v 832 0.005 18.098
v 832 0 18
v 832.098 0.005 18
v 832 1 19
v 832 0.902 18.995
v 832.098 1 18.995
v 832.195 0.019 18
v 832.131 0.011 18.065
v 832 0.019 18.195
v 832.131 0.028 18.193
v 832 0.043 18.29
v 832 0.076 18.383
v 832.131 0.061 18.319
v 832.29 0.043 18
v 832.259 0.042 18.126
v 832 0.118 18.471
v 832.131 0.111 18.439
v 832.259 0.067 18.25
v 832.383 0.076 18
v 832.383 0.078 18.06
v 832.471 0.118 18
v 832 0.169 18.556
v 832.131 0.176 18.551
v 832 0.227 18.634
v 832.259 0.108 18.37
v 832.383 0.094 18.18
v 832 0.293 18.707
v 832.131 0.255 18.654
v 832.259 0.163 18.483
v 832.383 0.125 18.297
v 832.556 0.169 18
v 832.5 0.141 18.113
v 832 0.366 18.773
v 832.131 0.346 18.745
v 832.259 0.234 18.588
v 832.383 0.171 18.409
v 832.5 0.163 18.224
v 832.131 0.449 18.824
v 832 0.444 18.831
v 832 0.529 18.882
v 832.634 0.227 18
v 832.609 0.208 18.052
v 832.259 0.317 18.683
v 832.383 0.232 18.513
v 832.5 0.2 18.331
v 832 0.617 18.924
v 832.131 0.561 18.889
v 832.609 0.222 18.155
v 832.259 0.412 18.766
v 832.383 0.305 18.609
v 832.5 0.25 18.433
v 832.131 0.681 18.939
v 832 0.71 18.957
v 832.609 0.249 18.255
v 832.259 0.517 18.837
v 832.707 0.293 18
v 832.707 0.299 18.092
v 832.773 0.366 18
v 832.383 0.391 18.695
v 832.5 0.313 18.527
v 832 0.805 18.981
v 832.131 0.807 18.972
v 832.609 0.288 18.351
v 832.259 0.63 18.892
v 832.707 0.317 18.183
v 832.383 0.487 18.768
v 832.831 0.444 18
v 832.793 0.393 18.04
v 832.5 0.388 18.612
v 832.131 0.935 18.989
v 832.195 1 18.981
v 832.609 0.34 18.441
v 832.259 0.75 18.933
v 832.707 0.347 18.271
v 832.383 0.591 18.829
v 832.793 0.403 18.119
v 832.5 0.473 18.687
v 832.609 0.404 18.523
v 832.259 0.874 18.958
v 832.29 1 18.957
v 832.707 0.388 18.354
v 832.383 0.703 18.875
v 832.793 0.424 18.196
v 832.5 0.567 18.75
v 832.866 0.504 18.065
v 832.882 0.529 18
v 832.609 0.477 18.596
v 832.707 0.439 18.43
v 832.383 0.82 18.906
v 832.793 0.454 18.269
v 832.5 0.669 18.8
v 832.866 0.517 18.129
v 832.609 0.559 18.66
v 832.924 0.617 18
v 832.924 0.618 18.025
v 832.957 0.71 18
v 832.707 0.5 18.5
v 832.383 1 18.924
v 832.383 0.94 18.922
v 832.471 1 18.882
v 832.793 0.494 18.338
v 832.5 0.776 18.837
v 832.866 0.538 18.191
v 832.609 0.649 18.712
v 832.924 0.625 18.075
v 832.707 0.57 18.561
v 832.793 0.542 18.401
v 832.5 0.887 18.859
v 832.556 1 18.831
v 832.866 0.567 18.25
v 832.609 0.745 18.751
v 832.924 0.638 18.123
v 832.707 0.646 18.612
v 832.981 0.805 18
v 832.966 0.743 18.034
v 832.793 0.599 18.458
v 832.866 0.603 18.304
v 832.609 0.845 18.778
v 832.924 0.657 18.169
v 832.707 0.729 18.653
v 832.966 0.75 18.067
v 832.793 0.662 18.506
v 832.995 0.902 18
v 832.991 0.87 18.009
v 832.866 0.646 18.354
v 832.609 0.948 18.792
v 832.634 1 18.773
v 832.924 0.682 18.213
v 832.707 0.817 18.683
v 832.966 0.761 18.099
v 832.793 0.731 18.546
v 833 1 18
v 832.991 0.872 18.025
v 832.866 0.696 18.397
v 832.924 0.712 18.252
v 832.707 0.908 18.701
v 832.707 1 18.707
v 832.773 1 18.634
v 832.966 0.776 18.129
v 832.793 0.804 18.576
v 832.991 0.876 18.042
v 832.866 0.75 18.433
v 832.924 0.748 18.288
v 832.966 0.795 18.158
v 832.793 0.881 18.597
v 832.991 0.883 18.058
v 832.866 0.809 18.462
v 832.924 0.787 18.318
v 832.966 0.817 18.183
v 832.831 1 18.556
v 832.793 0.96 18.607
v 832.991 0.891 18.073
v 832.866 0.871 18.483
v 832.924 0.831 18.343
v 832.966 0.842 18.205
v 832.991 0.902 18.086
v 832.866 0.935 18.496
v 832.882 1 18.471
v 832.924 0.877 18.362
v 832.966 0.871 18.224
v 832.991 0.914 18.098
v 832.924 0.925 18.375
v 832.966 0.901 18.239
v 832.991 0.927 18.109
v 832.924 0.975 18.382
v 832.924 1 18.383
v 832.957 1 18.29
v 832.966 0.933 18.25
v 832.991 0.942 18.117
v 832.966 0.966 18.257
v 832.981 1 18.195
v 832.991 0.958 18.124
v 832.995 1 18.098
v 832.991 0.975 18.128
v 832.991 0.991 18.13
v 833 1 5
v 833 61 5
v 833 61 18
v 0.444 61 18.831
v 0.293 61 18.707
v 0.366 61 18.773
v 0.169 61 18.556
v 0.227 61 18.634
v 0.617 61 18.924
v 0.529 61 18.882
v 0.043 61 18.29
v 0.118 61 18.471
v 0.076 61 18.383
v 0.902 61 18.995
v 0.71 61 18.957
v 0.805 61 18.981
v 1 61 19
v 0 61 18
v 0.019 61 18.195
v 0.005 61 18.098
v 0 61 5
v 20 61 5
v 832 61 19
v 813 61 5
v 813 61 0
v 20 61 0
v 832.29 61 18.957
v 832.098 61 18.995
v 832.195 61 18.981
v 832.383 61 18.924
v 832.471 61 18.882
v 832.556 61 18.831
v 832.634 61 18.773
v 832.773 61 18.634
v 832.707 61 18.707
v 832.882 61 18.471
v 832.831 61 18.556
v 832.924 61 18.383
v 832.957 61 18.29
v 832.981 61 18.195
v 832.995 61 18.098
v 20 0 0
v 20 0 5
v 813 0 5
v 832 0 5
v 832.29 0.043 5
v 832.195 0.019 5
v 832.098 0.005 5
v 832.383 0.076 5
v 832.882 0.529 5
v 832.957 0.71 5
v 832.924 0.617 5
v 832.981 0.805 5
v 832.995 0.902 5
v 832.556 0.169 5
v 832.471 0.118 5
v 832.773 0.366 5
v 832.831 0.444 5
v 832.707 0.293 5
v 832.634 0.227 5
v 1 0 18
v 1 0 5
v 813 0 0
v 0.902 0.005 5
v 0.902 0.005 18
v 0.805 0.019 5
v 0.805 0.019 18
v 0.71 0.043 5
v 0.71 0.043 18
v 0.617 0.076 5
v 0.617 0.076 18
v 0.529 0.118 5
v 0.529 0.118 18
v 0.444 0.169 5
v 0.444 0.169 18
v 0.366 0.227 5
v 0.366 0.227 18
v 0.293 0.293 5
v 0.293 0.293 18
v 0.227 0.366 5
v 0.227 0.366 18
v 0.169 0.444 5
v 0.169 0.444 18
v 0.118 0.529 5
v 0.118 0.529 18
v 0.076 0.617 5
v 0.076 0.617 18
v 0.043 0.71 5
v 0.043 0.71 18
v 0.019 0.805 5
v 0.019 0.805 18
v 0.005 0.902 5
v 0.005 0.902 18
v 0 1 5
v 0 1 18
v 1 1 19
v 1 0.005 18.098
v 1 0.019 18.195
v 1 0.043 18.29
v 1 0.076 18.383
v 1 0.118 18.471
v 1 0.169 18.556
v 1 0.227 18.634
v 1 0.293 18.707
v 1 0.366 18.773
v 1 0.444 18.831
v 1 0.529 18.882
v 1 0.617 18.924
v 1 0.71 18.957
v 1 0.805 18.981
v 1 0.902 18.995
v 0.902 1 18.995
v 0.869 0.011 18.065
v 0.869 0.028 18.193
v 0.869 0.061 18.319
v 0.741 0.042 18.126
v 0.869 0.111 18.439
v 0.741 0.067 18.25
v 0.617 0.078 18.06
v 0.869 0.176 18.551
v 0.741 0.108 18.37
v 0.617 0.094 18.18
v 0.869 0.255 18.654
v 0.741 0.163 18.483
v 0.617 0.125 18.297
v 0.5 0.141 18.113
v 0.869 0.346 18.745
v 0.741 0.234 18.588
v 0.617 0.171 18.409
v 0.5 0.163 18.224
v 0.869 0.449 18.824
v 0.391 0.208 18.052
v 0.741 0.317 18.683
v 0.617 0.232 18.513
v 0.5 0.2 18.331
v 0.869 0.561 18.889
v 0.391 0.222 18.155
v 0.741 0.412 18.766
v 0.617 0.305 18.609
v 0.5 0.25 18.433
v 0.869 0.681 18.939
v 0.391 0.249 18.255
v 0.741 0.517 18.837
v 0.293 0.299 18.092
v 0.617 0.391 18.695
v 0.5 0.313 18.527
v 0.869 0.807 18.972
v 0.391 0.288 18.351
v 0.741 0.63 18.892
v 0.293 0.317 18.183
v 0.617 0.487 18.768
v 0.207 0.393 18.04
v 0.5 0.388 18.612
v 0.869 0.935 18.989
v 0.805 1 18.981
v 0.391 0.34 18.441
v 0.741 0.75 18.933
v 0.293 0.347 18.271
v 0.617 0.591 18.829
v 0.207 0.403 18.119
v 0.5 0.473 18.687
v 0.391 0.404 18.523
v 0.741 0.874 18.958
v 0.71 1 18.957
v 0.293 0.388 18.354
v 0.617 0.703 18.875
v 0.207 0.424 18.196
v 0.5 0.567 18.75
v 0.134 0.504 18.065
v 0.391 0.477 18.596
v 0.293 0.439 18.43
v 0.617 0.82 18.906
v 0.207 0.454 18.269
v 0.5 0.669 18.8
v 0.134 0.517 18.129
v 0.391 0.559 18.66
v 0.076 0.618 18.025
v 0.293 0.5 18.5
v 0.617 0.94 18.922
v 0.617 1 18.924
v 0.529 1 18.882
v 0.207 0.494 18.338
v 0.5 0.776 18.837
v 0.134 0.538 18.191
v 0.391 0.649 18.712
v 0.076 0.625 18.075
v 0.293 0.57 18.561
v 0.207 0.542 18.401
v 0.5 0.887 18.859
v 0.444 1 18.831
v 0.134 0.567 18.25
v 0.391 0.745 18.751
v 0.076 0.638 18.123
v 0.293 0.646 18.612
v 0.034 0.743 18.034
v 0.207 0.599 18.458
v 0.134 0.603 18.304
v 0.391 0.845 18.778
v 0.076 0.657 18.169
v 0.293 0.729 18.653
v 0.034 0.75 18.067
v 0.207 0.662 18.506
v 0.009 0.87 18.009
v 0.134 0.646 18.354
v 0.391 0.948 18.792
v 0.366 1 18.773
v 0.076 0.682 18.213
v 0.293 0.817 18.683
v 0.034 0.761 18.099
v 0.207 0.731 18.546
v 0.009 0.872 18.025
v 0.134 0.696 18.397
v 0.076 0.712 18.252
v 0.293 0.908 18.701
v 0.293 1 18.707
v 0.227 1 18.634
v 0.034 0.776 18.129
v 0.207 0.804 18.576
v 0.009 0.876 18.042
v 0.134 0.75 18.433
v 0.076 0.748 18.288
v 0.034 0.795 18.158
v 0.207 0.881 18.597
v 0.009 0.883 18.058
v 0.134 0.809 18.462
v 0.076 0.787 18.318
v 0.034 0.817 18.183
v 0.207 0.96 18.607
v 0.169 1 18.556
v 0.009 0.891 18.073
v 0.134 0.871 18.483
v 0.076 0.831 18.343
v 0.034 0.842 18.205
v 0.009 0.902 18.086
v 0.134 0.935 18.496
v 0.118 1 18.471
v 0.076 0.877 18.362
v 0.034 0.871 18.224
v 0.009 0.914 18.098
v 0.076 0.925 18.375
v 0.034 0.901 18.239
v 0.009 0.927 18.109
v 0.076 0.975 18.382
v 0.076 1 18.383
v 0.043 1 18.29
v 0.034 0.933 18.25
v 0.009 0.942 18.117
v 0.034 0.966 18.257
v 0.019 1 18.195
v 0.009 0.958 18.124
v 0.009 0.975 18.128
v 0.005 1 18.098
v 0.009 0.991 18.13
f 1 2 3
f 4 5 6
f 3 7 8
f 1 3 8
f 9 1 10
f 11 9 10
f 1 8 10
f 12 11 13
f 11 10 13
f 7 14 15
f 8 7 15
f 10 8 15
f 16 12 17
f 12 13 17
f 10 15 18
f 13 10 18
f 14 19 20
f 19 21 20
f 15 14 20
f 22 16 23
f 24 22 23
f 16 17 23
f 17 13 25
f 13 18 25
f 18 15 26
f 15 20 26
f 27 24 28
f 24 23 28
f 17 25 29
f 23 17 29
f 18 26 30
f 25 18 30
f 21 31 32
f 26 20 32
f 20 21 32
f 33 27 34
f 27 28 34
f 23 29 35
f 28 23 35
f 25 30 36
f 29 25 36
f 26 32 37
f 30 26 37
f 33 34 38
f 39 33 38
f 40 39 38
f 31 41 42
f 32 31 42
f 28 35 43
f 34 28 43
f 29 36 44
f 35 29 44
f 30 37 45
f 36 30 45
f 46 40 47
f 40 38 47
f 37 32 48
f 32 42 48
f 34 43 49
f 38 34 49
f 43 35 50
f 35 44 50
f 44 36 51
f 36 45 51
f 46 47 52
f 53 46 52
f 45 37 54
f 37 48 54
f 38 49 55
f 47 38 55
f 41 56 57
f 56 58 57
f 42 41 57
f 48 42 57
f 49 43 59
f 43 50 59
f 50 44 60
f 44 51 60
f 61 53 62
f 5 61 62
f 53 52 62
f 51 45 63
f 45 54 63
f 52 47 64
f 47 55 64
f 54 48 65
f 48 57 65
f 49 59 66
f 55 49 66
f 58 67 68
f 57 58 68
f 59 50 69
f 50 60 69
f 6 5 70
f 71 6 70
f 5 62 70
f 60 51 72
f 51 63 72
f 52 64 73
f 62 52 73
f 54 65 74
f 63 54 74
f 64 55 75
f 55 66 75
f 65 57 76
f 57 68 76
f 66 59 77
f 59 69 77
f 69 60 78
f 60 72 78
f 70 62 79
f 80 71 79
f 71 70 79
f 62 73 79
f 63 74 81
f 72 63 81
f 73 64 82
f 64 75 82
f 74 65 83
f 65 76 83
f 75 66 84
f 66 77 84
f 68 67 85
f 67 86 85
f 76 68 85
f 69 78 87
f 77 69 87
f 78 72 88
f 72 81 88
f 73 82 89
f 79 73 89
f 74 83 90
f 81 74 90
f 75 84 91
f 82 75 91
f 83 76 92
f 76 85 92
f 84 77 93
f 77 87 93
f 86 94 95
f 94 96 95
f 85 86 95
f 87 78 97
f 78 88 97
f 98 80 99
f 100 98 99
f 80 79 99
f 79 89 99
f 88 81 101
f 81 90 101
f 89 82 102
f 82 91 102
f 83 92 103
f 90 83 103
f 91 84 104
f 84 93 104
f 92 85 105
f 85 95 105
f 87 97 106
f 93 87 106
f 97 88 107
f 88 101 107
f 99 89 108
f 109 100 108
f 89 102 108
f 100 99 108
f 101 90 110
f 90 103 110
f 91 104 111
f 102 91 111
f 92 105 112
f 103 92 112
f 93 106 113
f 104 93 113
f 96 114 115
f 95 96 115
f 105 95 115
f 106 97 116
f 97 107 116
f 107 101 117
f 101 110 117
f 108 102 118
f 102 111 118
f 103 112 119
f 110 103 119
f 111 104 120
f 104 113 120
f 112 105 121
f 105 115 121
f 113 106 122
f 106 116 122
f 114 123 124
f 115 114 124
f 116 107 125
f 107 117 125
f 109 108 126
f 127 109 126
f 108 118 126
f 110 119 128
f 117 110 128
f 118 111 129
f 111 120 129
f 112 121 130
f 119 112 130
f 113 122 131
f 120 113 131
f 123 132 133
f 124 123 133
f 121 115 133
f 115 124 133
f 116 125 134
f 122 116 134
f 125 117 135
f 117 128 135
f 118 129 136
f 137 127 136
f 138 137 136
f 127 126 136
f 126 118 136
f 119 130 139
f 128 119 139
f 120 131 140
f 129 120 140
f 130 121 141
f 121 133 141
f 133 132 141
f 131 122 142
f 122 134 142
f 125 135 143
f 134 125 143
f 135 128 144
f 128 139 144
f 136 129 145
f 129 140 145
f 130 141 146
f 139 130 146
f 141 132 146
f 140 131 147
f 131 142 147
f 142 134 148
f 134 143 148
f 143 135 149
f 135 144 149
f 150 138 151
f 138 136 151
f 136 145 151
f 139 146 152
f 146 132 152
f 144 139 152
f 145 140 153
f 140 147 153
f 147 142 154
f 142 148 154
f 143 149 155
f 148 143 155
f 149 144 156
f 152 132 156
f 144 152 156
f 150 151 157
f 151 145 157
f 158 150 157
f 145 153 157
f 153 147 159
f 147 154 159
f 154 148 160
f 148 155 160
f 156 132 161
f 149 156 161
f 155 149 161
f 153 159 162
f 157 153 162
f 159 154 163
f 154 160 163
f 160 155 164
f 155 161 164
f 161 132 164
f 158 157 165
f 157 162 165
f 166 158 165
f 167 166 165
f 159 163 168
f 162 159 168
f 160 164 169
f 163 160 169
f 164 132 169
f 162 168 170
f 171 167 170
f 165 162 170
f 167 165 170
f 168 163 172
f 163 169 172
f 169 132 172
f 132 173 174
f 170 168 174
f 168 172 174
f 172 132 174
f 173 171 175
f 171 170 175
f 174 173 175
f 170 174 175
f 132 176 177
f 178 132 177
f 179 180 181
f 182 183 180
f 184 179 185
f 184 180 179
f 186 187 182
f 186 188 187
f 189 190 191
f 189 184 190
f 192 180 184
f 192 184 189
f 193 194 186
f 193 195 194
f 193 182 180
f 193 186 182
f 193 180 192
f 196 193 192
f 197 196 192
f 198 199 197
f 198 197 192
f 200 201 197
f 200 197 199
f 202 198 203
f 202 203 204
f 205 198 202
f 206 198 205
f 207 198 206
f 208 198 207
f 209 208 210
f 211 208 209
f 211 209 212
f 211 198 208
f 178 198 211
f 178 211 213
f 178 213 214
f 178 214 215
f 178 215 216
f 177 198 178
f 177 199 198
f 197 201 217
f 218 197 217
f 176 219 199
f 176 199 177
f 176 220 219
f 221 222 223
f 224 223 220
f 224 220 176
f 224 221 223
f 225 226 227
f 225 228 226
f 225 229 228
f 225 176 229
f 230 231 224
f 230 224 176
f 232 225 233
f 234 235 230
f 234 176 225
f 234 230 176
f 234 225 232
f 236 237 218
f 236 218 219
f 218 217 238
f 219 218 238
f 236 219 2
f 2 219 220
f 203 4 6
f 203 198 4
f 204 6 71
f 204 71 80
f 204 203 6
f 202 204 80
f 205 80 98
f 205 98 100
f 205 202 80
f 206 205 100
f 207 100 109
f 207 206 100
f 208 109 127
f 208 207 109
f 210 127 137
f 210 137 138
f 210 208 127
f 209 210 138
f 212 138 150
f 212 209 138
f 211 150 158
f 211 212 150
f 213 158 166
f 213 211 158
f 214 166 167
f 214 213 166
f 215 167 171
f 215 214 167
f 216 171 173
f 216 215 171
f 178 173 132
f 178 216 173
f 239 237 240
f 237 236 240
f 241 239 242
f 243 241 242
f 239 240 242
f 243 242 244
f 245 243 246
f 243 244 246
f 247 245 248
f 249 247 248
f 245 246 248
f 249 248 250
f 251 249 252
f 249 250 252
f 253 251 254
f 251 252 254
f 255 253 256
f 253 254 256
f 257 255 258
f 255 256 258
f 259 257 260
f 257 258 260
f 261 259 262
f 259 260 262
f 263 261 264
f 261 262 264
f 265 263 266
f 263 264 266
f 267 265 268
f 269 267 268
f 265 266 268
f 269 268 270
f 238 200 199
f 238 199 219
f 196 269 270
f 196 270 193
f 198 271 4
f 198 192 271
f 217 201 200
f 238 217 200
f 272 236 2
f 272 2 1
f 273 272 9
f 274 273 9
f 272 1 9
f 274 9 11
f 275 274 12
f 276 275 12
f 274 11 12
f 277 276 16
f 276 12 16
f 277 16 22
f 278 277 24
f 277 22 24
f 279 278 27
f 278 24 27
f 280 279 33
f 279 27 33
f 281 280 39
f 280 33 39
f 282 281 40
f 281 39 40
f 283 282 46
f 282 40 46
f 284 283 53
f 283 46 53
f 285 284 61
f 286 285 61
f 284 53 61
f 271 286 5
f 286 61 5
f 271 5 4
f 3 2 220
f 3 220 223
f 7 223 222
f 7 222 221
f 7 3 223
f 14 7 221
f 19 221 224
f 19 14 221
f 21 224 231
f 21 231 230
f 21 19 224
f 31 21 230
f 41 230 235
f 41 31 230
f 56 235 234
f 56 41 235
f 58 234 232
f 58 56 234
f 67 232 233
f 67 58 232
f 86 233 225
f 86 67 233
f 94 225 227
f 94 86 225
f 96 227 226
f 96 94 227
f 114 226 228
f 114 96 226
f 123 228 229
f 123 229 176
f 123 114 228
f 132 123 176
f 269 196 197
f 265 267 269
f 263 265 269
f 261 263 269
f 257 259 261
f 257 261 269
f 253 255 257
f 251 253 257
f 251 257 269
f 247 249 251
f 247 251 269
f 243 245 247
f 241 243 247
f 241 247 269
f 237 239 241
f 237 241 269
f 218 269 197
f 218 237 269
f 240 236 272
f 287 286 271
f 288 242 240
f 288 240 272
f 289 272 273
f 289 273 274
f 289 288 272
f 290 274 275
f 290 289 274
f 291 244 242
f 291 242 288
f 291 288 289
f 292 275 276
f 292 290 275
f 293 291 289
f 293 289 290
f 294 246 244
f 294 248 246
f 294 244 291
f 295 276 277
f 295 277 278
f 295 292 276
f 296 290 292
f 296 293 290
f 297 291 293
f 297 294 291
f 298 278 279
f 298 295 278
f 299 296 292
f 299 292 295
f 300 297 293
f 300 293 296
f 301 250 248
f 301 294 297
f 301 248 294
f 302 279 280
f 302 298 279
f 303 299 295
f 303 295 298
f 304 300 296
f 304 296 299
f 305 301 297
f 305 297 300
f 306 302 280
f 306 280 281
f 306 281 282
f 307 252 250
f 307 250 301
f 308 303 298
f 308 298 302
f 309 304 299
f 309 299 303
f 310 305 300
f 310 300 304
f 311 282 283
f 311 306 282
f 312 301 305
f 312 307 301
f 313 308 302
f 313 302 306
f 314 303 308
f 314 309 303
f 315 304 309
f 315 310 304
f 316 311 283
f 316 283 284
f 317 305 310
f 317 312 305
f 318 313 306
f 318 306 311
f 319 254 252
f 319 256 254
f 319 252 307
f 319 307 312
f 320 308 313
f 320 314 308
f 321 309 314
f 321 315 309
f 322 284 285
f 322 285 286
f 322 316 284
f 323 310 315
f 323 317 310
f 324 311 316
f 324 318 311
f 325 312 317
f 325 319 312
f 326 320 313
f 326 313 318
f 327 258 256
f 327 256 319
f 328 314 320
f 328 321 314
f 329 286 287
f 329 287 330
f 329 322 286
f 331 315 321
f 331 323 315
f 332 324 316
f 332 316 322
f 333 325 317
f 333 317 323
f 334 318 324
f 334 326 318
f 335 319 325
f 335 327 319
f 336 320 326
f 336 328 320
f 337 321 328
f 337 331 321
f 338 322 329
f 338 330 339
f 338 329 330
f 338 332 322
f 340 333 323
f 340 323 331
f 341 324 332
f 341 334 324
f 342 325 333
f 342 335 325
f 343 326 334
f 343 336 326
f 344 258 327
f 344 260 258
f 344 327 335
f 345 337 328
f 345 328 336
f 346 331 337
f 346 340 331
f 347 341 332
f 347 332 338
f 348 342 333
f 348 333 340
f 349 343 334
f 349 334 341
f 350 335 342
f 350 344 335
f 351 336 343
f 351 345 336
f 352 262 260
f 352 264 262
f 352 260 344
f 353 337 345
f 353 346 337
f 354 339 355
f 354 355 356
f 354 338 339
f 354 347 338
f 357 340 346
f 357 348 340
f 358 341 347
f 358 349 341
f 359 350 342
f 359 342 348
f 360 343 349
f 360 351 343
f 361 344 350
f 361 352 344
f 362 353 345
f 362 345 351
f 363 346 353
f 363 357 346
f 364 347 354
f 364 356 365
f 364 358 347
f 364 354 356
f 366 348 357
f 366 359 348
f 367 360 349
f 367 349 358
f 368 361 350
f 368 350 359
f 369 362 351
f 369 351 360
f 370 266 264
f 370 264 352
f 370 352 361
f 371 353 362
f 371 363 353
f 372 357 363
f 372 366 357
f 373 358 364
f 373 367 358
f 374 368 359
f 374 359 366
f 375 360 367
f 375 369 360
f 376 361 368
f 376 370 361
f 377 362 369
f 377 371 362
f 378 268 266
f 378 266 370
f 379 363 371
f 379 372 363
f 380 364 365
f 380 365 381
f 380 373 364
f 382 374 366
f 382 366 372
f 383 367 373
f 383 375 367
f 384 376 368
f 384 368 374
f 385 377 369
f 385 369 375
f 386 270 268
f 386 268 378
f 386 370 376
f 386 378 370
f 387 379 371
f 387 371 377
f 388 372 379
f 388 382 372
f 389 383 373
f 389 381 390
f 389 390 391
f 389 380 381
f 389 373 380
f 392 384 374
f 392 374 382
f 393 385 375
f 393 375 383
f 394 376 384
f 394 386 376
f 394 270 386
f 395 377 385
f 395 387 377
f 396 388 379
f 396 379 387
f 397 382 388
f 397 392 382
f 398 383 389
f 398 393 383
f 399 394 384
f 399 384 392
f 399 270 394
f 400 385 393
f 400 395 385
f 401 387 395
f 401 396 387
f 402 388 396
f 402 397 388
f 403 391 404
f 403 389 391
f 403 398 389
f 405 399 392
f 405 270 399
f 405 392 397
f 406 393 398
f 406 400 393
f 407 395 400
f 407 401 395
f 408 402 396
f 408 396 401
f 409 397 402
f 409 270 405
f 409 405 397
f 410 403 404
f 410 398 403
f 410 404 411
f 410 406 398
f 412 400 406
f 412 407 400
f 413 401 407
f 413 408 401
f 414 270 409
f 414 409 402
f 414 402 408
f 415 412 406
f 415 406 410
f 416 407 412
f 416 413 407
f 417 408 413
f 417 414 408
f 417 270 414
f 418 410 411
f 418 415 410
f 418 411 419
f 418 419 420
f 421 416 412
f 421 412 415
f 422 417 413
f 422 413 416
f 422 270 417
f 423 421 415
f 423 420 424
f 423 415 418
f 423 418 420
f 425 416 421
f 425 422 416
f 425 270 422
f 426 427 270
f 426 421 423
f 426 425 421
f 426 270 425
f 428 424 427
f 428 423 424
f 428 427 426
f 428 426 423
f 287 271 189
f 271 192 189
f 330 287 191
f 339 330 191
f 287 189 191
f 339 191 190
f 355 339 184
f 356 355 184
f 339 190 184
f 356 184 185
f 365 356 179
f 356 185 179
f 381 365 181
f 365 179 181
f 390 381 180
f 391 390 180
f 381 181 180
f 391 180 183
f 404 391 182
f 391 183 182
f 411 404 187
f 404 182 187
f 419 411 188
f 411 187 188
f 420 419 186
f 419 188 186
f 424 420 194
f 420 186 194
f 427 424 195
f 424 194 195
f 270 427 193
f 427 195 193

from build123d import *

# Parameters (mm, degrees)
BOX_W           = 833
BOX_H           = 61
BOX_DEPTH       = 19
FILLET_R        = 1
FILLET001_R     = 1
SKETCH_W        = 20
SKETCH_H        = 63
POCKET_DEPTH    = 5
SKETCH001_W     = 20
SKETCH001_H     = 63
POCKET001_DEPTH = 5
FILLET002_R     = 1


with BuildPart() as part:
    # Box → Box (new body)
    with BuildSketch(Plane.XY):
        with Locations((416.5, 30.5)):
            Rectangle(BOX_W, BOX_H)
    extrude(amount=BOX_DEPTH)

    # Fillet
    fillet_edges = [part.edges().sort_by_distance(p)[0] for p in [
        (416.5, 0, 19),
    ]]
    fillet(fillet_edges, radius=FILLET_R)

    # Fillet001
    fillet001_edges = [part.edges().sort_by_distance(p)[0] for p in [
        (833, 31, 19),
    ]]
    fillet(fillet001_edges, radius=FILLET001_R)

    # Sketch (on Face5 of Fillet001) → Pocket (cut)
    with BuildSketch(Plane(origin=(0, 0, 0), x_dir=(1, 0, 0), z_dir=(0, 0, -1))):
        with Locations((10, -31.5)):
            Rectangle(SKETCH_W, SKETCH_H)
    extrude(amount=-POCKET_DEPTH, mode=Mode.SUBTRACT)

    # Sketch001 (on Face6 of Pocket) → Pocket001 (cut)
    with BuildSketch(Plane(origin=(0, 0, 0), x_dir=(1, 0, 0), z_dir=(0, 0, -1))):
        with Locations((823, -31.5)):
            Rectangle(SKETCH001_W, SKETCH001_H)
    extrude(amount=-POCKET001_DEPTH, mode=Mode.SUBTRACT)

    # Fillet002
    fillet002_edges = [part.edges().sort_by_distance(p)[0] for p in [
        (0, 0, 11.5),
    ]]
    fillet(fillet002_edges, radius=FILLET002_R)


solid = part.part
